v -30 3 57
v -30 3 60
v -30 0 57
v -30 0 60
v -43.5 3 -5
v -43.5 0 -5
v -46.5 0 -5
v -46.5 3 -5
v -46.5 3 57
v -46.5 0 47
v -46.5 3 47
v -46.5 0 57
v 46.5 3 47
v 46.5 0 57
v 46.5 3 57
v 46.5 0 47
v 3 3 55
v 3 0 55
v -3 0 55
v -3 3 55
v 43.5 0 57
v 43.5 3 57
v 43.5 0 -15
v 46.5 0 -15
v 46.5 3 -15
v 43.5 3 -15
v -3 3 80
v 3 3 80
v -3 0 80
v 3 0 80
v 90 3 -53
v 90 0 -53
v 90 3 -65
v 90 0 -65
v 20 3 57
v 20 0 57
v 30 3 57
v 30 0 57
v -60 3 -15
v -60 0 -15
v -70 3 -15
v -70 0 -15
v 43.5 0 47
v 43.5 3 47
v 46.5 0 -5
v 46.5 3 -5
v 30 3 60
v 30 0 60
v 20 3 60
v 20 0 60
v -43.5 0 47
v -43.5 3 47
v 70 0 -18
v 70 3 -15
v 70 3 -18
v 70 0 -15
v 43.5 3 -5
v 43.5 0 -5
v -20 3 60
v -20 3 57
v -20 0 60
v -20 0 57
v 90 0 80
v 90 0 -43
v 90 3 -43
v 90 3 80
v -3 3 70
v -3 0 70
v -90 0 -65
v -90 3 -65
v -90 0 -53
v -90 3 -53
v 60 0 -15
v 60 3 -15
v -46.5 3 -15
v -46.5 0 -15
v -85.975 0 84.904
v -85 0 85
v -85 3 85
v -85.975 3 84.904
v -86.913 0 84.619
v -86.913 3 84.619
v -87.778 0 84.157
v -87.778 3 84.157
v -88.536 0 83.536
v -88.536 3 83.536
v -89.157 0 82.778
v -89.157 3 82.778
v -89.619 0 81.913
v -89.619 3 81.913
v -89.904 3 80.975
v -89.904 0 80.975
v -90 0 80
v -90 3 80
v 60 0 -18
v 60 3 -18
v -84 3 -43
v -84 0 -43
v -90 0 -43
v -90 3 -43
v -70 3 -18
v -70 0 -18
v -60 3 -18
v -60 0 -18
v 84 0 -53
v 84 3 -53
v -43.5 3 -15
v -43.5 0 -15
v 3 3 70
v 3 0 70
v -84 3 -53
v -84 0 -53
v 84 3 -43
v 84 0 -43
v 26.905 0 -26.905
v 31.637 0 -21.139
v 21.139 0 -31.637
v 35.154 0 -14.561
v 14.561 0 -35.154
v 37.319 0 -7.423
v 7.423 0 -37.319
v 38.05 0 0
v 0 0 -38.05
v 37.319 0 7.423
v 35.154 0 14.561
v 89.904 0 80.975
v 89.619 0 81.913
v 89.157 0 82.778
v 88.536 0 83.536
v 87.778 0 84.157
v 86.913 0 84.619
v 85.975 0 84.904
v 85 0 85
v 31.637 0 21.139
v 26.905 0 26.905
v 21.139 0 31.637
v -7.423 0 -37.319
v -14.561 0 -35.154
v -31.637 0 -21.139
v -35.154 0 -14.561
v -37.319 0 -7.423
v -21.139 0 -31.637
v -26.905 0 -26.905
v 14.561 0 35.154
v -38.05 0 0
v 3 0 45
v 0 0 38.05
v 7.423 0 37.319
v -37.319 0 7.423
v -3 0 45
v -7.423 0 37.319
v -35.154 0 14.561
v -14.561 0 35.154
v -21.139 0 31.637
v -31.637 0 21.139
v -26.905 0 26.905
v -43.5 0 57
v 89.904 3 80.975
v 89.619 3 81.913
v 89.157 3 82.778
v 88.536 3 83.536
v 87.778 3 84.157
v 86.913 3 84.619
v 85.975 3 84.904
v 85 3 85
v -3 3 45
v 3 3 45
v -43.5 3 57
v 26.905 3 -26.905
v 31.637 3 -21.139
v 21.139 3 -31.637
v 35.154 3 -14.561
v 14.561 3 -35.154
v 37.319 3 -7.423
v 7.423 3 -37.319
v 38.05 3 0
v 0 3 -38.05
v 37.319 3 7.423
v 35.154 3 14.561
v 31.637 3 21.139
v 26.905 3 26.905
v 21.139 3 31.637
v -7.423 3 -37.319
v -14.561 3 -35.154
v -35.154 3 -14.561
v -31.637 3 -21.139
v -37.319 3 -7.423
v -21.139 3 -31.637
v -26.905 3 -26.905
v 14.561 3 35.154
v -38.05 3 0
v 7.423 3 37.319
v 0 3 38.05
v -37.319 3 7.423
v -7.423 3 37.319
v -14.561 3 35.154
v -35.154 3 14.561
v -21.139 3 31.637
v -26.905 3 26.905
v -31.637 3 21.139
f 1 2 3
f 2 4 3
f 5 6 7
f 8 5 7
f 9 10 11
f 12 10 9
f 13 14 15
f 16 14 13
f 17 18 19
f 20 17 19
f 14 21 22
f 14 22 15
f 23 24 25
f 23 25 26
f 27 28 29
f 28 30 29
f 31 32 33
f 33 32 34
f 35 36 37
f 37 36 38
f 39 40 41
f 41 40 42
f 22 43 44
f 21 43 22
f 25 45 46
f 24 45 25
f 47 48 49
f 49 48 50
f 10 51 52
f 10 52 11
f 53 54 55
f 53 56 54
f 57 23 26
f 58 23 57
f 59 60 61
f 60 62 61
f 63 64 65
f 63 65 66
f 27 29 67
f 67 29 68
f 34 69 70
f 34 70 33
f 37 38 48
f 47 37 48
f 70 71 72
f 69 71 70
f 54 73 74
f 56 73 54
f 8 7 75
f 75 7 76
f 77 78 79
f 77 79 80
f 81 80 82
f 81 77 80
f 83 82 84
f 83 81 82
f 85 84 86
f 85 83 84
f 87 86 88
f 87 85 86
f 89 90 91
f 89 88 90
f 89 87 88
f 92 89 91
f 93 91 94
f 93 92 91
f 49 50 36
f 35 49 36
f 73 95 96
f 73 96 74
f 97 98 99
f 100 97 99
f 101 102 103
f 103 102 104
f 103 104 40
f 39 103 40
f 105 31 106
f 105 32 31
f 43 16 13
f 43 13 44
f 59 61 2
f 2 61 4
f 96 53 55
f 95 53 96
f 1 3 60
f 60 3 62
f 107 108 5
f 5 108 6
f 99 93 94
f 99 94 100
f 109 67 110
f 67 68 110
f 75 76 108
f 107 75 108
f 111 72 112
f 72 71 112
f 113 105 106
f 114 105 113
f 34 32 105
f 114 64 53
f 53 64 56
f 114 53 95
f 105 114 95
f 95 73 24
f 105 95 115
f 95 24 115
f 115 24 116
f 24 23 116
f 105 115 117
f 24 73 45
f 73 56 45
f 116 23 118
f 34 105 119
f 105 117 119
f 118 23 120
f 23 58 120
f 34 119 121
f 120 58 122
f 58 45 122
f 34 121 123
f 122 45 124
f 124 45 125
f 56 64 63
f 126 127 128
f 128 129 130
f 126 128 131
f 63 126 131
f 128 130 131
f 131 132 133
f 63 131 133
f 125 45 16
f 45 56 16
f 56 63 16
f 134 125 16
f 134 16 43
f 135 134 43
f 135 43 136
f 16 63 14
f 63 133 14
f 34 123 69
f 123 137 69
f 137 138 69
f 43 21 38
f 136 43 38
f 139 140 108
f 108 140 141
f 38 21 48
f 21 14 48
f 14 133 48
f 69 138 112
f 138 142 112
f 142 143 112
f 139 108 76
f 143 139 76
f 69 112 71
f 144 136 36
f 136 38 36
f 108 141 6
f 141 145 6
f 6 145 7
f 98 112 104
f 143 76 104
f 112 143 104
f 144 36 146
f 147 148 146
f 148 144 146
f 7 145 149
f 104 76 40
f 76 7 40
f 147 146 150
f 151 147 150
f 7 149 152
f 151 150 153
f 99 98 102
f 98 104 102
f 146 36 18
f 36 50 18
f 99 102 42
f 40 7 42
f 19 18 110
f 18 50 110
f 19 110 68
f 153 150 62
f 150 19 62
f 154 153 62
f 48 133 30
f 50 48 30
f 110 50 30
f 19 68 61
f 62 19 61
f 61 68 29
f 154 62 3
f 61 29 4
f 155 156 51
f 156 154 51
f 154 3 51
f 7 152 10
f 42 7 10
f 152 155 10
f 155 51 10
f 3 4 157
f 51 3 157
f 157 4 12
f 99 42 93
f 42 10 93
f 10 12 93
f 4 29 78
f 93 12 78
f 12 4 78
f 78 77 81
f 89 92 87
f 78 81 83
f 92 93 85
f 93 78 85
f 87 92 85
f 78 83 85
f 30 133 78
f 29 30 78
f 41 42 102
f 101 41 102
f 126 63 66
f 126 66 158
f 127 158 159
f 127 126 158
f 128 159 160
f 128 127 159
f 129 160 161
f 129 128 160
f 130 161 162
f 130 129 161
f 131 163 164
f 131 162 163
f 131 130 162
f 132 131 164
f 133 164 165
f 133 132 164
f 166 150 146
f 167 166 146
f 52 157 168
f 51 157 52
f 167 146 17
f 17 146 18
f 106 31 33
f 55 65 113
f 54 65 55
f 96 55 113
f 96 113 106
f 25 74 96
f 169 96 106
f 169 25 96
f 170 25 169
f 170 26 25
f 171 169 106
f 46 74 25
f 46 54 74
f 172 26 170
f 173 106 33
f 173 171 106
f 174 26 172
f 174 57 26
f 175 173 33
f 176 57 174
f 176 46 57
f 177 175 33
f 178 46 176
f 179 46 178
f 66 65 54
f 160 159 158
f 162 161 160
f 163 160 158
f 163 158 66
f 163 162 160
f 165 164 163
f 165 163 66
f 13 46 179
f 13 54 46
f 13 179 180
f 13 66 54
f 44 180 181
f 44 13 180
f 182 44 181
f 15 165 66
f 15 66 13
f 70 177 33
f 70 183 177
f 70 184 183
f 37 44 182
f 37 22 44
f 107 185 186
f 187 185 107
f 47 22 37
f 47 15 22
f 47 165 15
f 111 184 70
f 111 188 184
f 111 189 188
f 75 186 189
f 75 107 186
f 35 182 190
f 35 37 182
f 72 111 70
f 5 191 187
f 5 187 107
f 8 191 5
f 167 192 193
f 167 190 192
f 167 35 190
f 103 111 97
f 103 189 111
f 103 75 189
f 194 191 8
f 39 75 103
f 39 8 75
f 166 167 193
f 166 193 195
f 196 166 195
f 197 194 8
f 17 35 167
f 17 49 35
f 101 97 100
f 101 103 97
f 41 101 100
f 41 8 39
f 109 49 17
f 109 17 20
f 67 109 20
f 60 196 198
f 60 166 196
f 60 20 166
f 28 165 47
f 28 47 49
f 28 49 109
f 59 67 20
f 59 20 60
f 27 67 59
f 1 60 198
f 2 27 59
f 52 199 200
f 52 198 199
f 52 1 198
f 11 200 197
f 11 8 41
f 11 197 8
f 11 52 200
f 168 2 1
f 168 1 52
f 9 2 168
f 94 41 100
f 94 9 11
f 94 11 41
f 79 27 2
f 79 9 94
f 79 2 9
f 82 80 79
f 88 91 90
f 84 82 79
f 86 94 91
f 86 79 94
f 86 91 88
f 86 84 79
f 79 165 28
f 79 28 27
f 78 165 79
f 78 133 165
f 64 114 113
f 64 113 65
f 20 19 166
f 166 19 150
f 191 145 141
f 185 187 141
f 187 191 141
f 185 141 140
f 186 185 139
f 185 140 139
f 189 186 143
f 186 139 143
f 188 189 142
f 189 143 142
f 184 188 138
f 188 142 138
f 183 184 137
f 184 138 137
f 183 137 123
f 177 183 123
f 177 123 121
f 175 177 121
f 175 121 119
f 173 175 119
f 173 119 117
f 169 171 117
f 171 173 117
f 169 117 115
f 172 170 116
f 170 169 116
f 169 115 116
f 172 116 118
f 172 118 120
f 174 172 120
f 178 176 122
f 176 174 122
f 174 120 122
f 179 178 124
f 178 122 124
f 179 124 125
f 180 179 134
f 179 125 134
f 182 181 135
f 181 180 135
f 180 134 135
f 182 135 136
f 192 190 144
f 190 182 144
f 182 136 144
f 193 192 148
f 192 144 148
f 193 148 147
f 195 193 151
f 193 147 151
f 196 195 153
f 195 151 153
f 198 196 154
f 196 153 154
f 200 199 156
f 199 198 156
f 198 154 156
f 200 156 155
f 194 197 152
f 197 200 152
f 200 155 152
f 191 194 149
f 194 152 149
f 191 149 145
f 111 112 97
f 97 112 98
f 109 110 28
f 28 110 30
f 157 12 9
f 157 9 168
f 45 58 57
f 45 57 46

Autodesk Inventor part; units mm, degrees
ref_plane "YZ Plane" through (0, 0, 0) normal (1, 0, 0) x (0, 1, 0)
ref_plane "XZ Plane" through (0, 0, 0) normal (0, 1, 0) x (-1, 0, 0)
ref_plane "XY Plane" through (0, 0, 0) normal (0, 0, 1) x (1, 0, 0)
sketch "Sketch2" plane through (0, 0, 0) normal (0, 1, 0) x (-1, 0, 0)
  line L0 (90, -53) -> (84, -53)
  line L1 (84, -53) -> (84, -43)
  line L2 (84, -43) -> (90, -43)
  line L3 (-90, -53) -> (-84, -53)
  line L4 (-84, -53) -> (-84, -43)
  line L5 (-84, -43) -> (-90, -43)
  line L6 (70, -18) -> (60, -18)
  line L7 (60, -18) -> (60, -15)
  line L8 (60, -15) -> (70, -15)
  line L9 (70, -15) -> (70, -18)
  line L10 (-70, -18) -> (-60, -18)
  line L11 (-60, -18) -> (-60, -15)
  line L12 (-60, -15) -> (-70, -15)
  line L13 (-70, -15) -> (-70, -18)
  circle A0 centre (0, 0) radius 38.05
  line L14 (46.5, -15) -> (43.5, -15)
  line L15 (43.5, -15) -> (43.5, -5)
  line L16 (43.5, -5) -> (46.5, -5)
  line L17 (46.5, -5) -> (46.5, -15)
  line L18 (-46.5, -15) -> (-43.5, -15)
  line L19 (-43.5, -15) -> (-43.5, -5)
  line L20 (-43.5, -5) -> (-46.5, -5)
  line L21 (-46.5, -5) -> (-46.5, -15)
  line L22 (43.5, 57) -> (43.5, 47)
  line L23 (43.5, 47) -> (46.5, 47)
  line L24 (46.5, 47) -> (46.5, 57)
  line L25 (-46.5, 47) -> (-43.5, 47)
  line L26 (-43.5, 47) -> (-43.5, 57)
  line L27 (-46.5, 57) -> (-46.5, 47)
  line L28 (-85, 85) -> (85, 85)
  arc A1 (-85, 85) -> (-90, 80) centre (-85, 80) ccw
  arc A2 (90, 80) -> (85, 85) centre (85, 80) ccw
  line L29 (46.5, 57) -> (43.5, 57)
  line L30 (-43.5, 57) -> (-46.5, 57)
  line L31 (30, 57) -> (20, 57)
  line L32 (20, 57) -> (20, 60)
  line L33 (20, 60) -> (30, 60)
  line L34 (30, 60) -> (30, 57)
  line L35 (-20, 57) -> (-30, 57)
  line L36 (-30, 57) -> (-30, 60)
  line L37 (-30, 60) -> (-20, 60)
  line L38 (-20, 60) -> (-20, 57)
  line L39 (3, 70) -> (-3, 70)
  line L40 (-3, 70) -> (-3, 80)
  line L41 (-3, 80) -> (3, 80)
  line L42 (3, 80) -> (3, 70)
  line L43 (3, 45) -> (-3, 45)
  line L44 (-3, 45) -> (-3, 55)
  line L45 (-3, 55) -> (3, 55)
  line L46 (3, 55) -> (3, 45)
  line L47 (-90, -43) -> (-90, 80)
  line L48 (90, 80) -> (90, -43)
  line L49 (90, -53) -> (90, -65)
  line L50 (-90, -53) -> (-90, -65)
  line L51 (90, -65) -> (-90, -65)
  point P0 (-91.6845, 9.0823)
  point P1 (90, 85)
  dimension "d21" = 6
  dimension "d22" = 10
  dimension "d25" = 6
  dimension "d26" = 10
  dimension "d31" = 3
  dimension "d32" = 10
  dimension "d35" = 3
  dimension "d36" = 10
  dimension "d39" = 25
  dimension "d40" = 25
  dimension "d43" = 76.1
  dimension "d52" = 3
  dimension "d53" = 10
  dimension "d54" = 10
  dimension "d55" = 3
  dimension "d58" = 10
  dimension "d59" = 3
  dimension "d62" = 3
  dimension "d65" = 180
  dimension "d66" = 150
  dimension "d90" = 90
  dimension "d91" = 90
  dimension "d103" = 10
  dimension "d104" = 10
  dimension "d108" = 3
  dimension "d109" = 10
  dimension "d110" = 20
  dimension "d111" = 3
  dimension "d112" = 10
  dimension "d113" = 20
  dimension "d114" = 5
  dimension "d115" = 10
  dimension "d116" = 6
  dimension "d117" = 3
  dimension "d118" = 10
  dimension "d119" = 6
  dimension "d120" = 15
  dimension "d121" = 3
extrude "Extrusion6" add sketch "Sketch2" along normal blind 3
properties part number "OpenROV 2_2a Top"
